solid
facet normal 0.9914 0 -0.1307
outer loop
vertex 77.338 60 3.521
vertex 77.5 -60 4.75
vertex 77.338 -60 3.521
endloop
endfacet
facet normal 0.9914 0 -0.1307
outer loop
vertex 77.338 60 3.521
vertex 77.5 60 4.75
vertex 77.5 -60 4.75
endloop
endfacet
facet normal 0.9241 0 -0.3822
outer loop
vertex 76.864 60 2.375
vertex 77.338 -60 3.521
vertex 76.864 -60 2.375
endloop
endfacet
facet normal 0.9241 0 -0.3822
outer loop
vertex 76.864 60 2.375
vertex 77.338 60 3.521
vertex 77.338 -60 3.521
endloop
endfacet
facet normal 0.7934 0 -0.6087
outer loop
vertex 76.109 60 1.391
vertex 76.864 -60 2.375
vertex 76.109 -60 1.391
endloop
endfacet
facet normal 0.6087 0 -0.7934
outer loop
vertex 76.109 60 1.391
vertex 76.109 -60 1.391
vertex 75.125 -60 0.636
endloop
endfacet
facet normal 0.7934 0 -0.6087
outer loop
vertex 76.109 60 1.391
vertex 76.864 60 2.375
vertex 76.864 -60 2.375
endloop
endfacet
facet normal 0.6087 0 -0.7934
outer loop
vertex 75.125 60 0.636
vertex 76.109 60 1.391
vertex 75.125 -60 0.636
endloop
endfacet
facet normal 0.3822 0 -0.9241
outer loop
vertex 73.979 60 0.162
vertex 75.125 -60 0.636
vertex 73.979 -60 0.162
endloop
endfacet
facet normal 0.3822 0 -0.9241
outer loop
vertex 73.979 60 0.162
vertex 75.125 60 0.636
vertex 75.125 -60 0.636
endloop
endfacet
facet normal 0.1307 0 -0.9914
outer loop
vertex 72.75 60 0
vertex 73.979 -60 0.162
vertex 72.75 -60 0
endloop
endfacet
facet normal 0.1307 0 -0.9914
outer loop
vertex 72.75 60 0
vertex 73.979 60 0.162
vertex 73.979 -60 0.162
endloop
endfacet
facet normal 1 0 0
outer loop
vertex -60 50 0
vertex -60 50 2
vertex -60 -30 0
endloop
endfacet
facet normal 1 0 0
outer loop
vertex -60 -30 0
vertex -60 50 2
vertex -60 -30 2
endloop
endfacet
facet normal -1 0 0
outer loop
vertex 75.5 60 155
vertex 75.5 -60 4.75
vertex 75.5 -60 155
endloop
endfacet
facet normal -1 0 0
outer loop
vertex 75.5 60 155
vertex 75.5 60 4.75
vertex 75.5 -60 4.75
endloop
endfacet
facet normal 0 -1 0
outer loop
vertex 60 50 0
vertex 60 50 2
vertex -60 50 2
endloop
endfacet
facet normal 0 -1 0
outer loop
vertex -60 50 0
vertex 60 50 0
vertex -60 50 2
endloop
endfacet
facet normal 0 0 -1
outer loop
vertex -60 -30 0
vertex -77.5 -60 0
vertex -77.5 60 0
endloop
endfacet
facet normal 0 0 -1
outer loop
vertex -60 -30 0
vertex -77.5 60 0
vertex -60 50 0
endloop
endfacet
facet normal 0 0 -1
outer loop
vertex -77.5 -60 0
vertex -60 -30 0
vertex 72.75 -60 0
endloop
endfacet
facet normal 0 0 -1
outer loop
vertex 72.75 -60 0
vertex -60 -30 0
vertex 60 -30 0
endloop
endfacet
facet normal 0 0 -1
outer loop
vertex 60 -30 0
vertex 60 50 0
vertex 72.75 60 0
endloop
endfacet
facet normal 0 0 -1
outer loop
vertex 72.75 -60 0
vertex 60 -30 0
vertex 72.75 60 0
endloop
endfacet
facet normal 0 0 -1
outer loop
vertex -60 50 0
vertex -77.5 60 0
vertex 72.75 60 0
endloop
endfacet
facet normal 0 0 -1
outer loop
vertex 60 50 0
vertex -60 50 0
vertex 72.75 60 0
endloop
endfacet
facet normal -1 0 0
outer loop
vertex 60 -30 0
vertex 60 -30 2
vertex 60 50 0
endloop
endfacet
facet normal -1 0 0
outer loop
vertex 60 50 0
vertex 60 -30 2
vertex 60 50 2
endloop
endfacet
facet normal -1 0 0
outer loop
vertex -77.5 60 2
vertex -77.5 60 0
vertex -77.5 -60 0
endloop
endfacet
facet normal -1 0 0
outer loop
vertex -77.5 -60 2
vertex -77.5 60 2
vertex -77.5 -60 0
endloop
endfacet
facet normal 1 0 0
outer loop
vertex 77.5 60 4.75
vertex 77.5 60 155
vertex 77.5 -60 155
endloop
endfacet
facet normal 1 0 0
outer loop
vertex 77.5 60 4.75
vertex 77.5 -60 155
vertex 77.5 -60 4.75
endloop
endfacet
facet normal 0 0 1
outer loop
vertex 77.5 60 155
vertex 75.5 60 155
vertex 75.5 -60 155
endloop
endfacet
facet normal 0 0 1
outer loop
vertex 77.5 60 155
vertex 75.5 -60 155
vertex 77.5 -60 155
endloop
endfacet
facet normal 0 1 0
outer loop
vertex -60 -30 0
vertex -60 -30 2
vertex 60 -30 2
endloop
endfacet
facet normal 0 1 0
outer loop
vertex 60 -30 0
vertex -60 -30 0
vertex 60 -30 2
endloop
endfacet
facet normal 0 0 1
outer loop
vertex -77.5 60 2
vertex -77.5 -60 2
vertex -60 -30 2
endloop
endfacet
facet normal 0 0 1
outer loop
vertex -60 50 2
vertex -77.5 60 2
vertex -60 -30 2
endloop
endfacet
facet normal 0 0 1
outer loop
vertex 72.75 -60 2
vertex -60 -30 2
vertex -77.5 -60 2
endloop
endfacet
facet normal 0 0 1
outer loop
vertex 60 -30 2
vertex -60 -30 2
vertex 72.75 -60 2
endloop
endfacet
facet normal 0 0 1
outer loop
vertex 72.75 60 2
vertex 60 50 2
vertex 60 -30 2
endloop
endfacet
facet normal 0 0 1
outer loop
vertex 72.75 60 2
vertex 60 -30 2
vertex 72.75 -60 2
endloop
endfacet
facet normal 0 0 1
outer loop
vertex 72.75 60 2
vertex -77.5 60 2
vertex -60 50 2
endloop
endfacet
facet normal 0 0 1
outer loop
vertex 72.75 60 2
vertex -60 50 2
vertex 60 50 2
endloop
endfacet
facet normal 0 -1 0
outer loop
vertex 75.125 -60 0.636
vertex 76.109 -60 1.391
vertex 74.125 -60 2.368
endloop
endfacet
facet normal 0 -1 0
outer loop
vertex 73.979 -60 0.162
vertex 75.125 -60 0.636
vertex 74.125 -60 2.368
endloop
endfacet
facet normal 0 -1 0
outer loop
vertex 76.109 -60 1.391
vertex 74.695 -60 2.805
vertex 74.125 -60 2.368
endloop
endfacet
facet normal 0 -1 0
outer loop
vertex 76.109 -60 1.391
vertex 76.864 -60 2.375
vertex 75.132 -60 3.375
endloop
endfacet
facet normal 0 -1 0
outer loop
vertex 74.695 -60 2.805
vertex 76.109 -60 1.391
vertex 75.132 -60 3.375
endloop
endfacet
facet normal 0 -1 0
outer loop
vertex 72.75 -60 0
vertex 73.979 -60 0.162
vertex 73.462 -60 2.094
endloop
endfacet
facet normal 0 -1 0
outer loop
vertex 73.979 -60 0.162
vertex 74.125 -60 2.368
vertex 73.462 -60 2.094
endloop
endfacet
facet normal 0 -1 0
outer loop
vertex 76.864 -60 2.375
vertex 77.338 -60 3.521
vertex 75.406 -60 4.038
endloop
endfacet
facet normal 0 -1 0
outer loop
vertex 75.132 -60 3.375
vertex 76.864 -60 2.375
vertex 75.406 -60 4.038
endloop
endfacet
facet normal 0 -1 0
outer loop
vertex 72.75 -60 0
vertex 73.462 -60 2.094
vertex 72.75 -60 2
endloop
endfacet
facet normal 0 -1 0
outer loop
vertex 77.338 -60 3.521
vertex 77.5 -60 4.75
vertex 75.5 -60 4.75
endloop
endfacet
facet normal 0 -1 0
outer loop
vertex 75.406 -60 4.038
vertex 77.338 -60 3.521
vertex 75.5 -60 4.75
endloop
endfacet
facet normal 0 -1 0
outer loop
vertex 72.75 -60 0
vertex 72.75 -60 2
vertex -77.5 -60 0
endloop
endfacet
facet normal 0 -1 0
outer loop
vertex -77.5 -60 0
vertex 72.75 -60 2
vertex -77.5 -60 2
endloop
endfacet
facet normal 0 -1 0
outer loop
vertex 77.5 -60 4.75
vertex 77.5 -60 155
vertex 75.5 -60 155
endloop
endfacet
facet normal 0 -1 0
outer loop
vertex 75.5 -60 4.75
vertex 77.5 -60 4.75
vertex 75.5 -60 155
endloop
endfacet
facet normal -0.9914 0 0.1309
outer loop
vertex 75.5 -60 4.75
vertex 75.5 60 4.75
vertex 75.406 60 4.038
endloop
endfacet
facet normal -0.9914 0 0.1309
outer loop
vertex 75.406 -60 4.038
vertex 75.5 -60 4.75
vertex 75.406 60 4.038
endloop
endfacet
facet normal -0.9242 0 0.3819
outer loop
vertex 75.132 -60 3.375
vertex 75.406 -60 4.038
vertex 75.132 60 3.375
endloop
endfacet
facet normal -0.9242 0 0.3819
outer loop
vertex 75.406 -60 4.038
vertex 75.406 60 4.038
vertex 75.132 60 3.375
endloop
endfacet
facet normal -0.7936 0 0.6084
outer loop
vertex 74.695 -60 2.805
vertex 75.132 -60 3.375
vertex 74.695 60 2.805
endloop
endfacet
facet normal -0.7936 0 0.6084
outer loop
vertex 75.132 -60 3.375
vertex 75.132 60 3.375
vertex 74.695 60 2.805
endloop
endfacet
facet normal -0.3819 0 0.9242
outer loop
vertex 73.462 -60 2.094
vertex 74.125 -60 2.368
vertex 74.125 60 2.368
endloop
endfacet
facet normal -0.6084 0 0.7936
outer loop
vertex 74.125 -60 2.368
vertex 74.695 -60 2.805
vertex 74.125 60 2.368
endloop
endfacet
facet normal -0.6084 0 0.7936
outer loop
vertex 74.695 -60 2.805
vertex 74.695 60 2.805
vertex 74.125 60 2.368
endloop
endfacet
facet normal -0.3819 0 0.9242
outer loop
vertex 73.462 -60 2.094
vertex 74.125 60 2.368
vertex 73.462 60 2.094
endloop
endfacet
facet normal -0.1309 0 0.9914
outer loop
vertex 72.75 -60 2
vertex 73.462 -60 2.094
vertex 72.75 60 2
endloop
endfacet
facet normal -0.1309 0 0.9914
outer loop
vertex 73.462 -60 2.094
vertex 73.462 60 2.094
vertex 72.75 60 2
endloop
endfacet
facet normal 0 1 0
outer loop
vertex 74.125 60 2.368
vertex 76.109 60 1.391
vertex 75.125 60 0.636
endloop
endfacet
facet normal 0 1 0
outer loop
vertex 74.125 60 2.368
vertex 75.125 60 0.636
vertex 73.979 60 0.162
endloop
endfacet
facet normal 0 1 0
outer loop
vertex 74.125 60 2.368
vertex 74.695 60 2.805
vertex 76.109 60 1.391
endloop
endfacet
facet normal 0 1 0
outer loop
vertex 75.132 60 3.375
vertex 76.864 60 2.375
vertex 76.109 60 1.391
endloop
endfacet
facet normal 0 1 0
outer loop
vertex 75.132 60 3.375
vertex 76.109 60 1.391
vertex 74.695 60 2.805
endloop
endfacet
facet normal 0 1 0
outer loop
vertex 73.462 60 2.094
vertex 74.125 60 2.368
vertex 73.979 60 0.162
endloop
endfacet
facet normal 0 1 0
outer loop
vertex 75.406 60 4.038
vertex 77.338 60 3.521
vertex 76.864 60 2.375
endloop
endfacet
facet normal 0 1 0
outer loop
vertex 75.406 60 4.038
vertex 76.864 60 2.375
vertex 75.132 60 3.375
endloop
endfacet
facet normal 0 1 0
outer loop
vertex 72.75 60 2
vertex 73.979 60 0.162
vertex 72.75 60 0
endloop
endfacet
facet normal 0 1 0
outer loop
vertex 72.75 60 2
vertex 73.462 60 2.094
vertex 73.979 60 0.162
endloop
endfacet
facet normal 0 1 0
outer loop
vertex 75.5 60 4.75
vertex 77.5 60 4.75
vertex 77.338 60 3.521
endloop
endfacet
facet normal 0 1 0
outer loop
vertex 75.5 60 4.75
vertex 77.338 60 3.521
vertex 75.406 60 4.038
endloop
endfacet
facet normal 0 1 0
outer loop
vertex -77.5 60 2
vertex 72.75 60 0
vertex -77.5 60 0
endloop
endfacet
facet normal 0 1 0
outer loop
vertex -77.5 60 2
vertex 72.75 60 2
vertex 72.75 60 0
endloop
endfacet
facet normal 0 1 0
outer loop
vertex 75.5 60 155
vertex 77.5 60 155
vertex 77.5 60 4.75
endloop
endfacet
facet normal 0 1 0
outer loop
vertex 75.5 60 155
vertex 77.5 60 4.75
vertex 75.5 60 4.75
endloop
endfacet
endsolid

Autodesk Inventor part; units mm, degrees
ref_plane "YZ Plane" through (0, 0, 0) normal (1, 0, 0) x (0, 1, 0)
ref_plane "XZ Plane" through (0, 0, 0) normal (0, 1, 0) x (-1, 0, 0)
ref_plane "XY Plane" through (0, 0, 0) normal (0, 0, 1) x (1, 0, 0)
sketch "Sketch1" plane through (0, 0, 0) normal (0, 0, 1) x (1, 0, 0)
  line L0 (-77.5, -60) -> (77.5, -60)
  line L1 (77.5, -60) -> (77.5, 60)
  line L2 (77.5, 60) -> (-77.5, 60)
  line L3 (-77.5, 60) -> (-77.5, -60)
  line L4 (-77.5, -60) -> (77.5, 60) construction
  line L5 (77.5, -60) -> (-77.5, 60) construction
  point P0 (0, 0)
  dimension "d154" = 155
  dimension "d155" = 120
extrude "Plate3" add sketch "Sketch1" along normal blind 2
sketch "Sketch7" plane through (75.5, 60, 0) normal (1, 0, 0) x (0, 1, 0)
  line L0 (-120, 0) -> (0, 0)
  line L1 (0, 0) -> (0, 155)
  line L2 (0, 155) -> (-120, 155)
  line L3 (-120, 155) -> (-120, 0)
edge flange "Flange3" height 155 angle 90 thickness 2 bend radius 2.75 thickness toward (1, 0, 0) relief round relief width 2 relief depth 1 edges at (77.5, 0, 2) wall of the first edge with corners at (75.5, -60, 0) (75.5, 60, 0) (75.5, 60, 155) (75.5, -60, 155)
bend "Bend3"
corner "Corner3"
sketch "Sketch8" plane through (0, 0, 2) normal (0, 0, 1) x (1, 0, 0)
  line L0 (60, 50) -> (-60, 50)
  line L1 (-60, 50) -> (-60, -30)
  line L2 (-60, -30) -> (60, -30)
  line L3 (60, -30) -> (60, 50)
  line L4 (60, 50) -> (-60, -30) construction
  line L5 (-60, 50) -> (60, -30) construction
  line L6 (-77.5, 60) -> (72.75, 60) projected
  point P0 (0, 0)
  point P1 (0, 10)
  dimension "d166" = 120
  dimension "d167" = 80
  dimension "d168" = 10
extrude "Cut1" cut sketch "Sketch8" against normal blind 2
equation "\"БОРТ_стрингер_3_высота\" = 63"
equation "\"БОРТ_стрингер_4_высота\" = 48"
equation "\"БОРТ_стрингер_5_высота\" = 54"
equation "\"БОРТ_стрингер_6_высота\" = 81"
properties part number "MNT-CDF-503  main tube 1" material "Stainless Steel"
